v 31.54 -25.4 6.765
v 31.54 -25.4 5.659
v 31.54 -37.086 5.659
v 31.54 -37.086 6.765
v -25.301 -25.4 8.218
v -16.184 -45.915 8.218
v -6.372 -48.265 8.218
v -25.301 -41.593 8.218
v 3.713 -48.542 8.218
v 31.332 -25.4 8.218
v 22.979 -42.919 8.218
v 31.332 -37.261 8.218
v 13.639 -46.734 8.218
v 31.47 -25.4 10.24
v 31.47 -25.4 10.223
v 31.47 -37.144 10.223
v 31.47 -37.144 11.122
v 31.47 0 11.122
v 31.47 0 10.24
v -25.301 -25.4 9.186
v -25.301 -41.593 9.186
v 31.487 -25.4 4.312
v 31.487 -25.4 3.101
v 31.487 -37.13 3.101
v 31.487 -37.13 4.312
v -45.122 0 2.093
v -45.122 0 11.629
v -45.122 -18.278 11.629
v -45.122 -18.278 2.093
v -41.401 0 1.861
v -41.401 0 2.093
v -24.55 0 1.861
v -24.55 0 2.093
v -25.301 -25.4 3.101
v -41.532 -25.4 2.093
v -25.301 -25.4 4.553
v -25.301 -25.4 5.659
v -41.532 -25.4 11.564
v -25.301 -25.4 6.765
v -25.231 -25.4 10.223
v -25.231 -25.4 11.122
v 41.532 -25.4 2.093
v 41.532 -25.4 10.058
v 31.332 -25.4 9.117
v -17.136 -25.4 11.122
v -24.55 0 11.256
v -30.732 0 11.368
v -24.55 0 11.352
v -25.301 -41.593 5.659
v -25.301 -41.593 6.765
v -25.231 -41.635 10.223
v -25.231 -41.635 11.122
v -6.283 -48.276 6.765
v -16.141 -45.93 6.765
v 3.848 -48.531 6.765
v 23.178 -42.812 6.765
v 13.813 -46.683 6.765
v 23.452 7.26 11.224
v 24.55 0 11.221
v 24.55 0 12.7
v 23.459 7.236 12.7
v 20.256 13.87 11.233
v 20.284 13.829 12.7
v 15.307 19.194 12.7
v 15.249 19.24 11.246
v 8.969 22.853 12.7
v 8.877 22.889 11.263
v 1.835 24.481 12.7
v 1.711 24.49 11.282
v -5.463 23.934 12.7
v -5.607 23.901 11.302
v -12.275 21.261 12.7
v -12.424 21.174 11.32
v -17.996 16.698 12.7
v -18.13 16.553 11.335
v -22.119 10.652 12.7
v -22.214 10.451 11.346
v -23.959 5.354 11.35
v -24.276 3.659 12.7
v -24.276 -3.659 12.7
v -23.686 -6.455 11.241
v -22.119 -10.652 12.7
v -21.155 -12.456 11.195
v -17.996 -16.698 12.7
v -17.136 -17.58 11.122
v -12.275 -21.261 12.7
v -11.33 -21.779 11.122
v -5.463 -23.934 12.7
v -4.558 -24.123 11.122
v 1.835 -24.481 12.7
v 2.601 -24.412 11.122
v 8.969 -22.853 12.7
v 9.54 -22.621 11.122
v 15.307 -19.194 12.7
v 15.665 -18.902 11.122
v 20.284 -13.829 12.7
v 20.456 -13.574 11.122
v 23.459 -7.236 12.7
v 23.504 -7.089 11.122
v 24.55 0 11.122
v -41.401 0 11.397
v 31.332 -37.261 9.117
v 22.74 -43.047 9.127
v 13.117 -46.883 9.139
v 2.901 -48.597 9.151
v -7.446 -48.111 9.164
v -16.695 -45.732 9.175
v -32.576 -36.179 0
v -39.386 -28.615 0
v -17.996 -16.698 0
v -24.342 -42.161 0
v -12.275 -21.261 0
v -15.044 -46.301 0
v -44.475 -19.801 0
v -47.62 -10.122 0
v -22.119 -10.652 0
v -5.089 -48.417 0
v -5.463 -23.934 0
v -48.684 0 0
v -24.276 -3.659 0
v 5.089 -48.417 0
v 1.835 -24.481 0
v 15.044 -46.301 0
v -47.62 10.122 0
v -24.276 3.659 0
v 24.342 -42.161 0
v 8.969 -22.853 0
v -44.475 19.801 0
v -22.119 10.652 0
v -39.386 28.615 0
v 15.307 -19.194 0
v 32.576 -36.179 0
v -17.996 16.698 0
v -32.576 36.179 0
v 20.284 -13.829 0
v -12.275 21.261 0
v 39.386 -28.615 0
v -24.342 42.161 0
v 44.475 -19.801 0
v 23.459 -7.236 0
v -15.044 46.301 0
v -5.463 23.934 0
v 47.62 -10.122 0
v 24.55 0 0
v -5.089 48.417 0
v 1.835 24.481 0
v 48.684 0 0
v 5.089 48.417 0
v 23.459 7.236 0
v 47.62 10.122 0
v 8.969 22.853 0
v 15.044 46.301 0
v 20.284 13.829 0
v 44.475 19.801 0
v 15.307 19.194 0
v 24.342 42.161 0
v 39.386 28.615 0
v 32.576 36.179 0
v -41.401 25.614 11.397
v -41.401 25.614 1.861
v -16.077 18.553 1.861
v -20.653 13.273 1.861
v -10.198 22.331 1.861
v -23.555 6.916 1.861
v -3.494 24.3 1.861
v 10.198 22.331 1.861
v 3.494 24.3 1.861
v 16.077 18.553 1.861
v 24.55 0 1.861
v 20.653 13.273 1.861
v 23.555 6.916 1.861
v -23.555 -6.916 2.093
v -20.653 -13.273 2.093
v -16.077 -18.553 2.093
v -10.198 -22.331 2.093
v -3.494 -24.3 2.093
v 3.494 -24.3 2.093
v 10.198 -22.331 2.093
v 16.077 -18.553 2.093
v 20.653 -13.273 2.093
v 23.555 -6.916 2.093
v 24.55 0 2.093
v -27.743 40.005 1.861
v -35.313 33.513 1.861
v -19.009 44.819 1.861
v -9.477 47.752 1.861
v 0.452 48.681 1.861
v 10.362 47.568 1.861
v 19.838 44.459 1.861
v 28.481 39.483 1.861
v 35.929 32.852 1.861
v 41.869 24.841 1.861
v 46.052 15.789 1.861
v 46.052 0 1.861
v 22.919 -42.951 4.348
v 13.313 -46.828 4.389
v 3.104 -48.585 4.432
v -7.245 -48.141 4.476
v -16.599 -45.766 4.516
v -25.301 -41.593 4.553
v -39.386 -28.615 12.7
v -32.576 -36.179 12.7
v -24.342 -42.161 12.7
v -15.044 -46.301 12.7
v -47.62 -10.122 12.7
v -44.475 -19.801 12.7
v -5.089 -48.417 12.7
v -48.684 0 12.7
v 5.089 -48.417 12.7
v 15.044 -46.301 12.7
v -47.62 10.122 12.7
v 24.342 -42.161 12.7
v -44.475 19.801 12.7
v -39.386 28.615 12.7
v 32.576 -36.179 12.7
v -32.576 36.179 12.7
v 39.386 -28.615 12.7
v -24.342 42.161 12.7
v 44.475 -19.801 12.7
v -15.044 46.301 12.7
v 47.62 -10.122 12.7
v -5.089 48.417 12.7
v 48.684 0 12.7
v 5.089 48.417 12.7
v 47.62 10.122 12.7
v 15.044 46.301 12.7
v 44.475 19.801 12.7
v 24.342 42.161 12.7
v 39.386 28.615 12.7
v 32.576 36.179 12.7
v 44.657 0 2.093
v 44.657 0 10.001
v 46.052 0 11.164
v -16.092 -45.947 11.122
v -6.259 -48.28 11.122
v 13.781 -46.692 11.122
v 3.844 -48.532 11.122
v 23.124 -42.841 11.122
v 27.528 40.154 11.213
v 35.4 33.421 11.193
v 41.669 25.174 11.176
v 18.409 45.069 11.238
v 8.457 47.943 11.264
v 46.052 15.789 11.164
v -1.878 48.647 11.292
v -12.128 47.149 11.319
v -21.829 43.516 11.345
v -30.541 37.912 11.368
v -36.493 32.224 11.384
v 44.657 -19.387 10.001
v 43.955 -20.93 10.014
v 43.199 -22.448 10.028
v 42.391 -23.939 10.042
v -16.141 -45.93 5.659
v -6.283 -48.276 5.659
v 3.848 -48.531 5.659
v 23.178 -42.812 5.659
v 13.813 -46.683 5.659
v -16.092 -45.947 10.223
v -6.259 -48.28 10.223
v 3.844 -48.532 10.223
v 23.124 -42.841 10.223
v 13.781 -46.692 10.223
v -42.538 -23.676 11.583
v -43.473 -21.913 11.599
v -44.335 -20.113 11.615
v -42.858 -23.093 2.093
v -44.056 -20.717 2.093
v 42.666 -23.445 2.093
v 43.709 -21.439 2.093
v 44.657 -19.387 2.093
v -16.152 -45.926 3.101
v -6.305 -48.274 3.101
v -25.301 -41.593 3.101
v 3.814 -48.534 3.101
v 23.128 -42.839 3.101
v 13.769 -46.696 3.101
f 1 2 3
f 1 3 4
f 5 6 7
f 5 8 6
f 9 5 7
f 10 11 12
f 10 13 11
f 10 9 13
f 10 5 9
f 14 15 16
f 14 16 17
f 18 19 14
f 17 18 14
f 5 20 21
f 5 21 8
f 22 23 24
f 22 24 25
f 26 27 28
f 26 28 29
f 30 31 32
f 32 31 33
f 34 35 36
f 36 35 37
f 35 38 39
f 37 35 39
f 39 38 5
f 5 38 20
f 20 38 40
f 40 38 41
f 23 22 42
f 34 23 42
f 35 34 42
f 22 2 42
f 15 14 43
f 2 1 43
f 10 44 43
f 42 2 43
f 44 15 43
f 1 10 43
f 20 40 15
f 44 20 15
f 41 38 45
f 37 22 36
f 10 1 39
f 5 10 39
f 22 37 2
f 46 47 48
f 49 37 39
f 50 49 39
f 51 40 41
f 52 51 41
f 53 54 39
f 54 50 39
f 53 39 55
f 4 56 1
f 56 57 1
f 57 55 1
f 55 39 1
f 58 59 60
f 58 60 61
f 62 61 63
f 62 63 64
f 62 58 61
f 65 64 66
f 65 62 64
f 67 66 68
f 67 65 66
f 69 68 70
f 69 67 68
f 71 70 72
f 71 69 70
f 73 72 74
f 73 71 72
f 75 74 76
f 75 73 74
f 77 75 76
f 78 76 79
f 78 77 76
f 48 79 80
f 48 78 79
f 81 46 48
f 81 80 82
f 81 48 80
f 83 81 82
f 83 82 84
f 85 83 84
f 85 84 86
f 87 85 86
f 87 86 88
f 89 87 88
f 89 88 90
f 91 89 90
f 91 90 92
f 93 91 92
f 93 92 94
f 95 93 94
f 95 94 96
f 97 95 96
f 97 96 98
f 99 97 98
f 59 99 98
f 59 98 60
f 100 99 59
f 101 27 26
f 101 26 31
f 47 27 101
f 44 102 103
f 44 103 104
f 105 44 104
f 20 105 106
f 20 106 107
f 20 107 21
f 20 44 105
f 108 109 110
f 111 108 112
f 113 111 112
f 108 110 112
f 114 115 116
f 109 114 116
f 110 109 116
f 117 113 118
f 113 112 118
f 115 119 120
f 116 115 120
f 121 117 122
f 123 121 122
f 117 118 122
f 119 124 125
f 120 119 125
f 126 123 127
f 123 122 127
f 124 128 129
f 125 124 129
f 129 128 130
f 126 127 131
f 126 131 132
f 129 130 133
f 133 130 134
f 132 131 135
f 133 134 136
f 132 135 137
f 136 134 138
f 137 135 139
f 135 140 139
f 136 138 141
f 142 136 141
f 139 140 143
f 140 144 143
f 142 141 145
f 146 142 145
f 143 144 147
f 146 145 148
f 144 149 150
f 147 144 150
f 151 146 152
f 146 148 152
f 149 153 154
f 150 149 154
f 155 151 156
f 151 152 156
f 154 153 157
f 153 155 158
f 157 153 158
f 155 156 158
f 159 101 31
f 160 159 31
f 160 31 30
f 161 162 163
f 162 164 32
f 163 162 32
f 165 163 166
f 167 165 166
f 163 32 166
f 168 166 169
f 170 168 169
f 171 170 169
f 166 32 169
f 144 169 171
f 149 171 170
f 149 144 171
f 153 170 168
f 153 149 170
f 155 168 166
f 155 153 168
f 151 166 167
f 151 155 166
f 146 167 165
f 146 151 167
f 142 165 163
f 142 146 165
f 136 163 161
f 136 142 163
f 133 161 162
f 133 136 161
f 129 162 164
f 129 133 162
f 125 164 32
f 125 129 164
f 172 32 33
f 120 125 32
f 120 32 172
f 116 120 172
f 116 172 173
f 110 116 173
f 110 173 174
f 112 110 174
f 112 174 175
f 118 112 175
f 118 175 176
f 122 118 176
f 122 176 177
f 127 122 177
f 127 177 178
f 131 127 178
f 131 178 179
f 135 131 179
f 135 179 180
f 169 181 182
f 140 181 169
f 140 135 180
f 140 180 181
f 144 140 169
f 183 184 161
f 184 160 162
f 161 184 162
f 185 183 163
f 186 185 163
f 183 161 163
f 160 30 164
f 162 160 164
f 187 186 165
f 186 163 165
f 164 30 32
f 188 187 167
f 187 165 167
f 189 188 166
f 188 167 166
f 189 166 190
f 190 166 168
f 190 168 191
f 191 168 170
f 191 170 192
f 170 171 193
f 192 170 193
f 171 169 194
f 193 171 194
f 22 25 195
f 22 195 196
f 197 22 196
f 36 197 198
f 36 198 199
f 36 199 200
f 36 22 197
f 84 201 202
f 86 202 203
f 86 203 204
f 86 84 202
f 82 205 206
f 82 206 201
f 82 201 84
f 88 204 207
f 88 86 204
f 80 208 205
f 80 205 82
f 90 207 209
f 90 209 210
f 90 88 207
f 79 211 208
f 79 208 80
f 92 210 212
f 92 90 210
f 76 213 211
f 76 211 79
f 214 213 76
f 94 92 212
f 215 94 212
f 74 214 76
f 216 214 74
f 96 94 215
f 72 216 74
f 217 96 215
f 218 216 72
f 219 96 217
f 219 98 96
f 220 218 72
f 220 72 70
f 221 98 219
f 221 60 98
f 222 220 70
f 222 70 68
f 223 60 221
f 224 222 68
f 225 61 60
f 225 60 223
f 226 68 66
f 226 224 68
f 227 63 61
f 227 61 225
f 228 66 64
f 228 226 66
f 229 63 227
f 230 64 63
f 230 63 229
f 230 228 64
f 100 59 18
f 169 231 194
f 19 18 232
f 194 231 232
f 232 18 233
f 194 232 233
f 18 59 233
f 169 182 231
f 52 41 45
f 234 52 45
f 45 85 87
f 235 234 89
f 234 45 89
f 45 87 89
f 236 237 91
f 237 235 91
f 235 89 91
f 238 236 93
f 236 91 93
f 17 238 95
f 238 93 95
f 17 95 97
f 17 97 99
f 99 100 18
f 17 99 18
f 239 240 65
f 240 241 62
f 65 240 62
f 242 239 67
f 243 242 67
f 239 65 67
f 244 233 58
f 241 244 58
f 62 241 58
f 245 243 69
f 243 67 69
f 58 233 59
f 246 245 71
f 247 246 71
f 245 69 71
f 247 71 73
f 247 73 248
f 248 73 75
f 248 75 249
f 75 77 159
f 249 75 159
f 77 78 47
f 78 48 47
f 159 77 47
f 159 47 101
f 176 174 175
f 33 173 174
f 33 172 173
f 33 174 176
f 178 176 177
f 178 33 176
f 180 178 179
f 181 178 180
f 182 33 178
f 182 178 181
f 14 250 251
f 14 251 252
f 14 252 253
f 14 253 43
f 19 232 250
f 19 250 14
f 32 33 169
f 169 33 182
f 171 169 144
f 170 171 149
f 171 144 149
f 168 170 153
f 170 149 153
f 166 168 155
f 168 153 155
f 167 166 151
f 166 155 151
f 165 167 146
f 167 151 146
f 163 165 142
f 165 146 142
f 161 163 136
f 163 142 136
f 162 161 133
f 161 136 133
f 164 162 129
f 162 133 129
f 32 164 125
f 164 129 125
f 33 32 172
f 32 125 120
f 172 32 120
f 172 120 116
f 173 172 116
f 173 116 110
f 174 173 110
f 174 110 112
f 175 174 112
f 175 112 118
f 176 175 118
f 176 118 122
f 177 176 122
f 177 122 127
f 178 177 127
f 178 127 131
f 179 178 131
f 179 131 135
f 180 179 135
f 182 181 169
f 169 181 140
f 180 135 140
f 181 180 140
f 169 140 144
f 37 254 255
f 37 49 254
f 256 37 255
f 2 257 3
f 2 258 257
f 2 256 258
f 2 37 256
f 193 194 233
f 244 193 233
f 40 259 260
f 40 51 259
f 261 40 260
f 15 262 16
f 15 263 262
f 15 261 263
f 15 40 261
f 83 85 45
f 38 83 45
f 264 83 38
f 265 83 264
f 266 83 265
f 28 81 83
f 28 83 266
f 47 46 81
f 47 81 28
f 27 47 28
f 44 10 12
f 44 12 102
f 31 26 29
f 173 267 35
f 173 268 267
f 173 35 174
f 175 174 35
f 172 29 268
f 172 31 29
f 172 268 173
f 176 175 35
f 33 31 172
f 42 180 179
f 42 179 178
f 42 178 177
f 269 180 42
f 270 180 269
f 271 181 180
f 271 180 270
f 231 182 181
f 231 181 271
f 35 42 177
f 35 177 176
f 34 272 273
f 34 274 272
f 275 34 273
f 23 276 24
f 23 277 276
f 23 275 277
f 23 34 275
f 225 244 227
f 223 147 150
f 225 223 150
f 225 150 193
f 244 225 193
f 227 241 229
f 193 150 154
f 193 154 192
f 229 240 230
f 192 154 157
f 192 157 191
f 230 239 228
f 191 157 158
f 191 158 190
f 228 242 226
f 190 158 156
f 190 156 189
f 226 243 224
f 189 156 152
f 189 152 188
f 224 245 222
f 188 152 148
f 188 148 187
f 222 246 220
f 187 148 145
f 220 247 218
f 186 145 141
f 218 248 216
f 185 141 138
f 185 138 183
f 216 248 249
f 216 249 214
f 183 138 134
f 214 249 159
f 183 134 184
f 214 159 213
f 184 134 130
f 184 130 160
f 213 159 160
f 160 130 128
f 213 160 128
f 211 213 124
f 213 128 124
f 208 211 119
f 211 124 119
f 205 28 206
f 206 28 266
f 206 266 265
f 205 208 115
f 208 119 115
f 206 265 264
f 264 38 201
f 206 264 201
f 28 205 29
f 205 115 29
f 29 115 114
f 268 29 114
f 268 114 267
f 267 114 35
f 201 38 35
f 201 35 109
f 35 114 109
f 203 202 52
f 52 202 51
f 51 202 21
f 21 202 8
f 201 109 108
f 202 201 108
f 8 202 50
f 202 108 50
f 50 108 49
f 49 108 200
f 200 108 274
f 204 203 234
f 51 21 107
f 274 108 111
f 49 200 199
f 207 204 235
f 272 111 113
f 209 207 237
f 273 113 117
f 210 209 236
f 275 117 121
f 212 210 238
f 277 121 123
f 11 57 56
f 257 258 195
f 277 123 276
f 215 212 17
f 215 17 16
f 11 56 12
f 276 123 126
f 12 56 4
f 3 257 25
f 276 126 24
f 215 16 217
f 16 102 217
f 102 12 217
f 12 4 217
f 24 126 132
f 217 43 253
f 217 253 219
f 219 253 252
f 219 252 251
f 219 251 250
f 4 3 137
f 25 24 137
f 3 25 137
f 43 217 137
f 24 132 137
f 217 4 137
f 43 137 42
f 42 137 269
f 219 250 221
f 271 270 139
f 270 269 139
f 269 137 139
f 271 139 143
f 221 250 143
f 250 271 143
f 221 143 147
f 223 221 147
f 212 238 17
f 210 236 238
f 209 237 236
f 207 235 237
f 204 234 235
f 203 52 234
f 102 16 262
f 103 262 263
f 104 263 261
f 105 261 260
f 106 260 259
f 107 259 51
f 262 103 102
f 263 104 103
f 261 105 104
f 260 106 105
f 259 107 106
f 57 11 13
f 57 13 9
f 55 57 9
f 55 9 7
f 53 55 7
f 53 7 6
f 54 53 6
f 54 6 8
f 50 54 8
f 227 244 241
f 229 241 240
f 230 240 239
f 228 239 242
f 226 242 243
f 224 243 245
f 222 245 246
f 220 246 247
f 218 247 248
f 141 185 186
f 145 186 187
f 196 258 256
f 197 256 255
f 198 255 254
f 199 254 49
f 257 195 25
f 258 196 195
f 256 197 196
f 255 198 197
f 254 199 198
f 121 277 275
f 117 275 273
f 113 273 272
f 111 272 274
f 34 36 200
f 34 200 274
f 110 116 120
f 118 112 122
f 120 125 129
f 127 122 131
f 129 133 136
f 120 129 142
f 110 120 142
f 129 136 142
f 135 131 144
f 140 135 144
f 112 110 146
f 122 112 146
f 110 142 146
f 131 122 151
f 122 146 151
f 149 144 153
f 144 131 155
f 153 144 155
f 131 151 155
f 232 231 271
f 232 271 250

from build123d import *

# Parameters (mm, degrees)
F0_R     = 48.683566
F0_R_2   = 24.549797
F1_DEPTH = 12.7
F2_DEPTH = 5.08
F4_DEPTH = 50.8
F6_DEPTH = 25.4
F7_W     = 56.701847
F7_H     = 0.898932
F7_W_2   = 56.840144
F7_H_2   = 1.106377
F8_DEPTH = 127


with BuildPart() as f1:
    # F0 (on Top) → F1 (new body)
    with BuildSketch(Plane.XY):
        Circle(F0_R)
        Circle(F0_R_2, mode=Mode.SUBTRACT)
    extrude(amount=F1_DEPTH)


with BuildPart() as f2:
    # F0 (on Top) → F2 (new body)
    with BuildSketch(Plane.XY):
        Circle(F0_R_2)
    extrude(amount=F2_DEPTH)


with BuildPart() as f4_tool:
    # F3 (on Front) → F4 (new body)
    with BuildSketch(Plane.XZ):
        Polygon((46.052266, 11.164187), (-41.400526, 11.396773), (-41.400526, 1.860698), (46.052266, 1.860698), align=None)
    extrude(amount=-F4_DEPTH)


with BuildPart() as f1_1:
    add(f1.part)

    # F4: cut by f4_tool
    add(f4_tool.part, mode=Mode.SUBTRACT)


with BuildPart() as f2_1:
    add(f2.part)

    # F4: cut by f4_tool
    add(f4_tool.part, mode=Mode.SUBTRACT)


with BuildPart() as f6_tool:
    # F5 (on Front) → F6 (new body)
    with BuildSketch(Plane.XZ):
        Polygon((44.656746, 10.001251), (-45.121919, 11.62936), (-45.121919, 2.093285), (44.656746, 2.093285), align=None)
    extrude(amount=F6_DEPTH)


with BuildPart() as f1_2:
    add(f1_1.part)

    # F6: cut by f6_tool
    add(f6_tool.part, mode=Mode.SUBTRACT)

    # F7 (on Front) → F8 (cut)
    with BuildSketch(Plane.XZ):
        with Locations((3.119551, 10.672379)):
            Rectangle(F7_W, F7_H)
        Polygon((31.332176, 9.116535), (-25.300521, 9.185684), (-25.300521, 8.217604), (31.332176, 8.217604), align=None)
        with Locations((3.119551, 6.212294)):
            Rectangle(F7_W_2, F7_H_2)
        Polygon((31.487264, 4.311653), (-25.300521, 4.552728), (-25.300521, 3.100608), (31.487264, 3.100608), align=None)
    extrude(amount=F8_DEPTH, mode=Mode.SUBTRACT)


with BuildPart() as f2_2:
    add(f2_1.part)

    # F6: cut by f6_tool
    add(f6_tool.part, mode=Mode.SUBTRACT)


solid = Compound([f1_2.part, f2_2.part])
